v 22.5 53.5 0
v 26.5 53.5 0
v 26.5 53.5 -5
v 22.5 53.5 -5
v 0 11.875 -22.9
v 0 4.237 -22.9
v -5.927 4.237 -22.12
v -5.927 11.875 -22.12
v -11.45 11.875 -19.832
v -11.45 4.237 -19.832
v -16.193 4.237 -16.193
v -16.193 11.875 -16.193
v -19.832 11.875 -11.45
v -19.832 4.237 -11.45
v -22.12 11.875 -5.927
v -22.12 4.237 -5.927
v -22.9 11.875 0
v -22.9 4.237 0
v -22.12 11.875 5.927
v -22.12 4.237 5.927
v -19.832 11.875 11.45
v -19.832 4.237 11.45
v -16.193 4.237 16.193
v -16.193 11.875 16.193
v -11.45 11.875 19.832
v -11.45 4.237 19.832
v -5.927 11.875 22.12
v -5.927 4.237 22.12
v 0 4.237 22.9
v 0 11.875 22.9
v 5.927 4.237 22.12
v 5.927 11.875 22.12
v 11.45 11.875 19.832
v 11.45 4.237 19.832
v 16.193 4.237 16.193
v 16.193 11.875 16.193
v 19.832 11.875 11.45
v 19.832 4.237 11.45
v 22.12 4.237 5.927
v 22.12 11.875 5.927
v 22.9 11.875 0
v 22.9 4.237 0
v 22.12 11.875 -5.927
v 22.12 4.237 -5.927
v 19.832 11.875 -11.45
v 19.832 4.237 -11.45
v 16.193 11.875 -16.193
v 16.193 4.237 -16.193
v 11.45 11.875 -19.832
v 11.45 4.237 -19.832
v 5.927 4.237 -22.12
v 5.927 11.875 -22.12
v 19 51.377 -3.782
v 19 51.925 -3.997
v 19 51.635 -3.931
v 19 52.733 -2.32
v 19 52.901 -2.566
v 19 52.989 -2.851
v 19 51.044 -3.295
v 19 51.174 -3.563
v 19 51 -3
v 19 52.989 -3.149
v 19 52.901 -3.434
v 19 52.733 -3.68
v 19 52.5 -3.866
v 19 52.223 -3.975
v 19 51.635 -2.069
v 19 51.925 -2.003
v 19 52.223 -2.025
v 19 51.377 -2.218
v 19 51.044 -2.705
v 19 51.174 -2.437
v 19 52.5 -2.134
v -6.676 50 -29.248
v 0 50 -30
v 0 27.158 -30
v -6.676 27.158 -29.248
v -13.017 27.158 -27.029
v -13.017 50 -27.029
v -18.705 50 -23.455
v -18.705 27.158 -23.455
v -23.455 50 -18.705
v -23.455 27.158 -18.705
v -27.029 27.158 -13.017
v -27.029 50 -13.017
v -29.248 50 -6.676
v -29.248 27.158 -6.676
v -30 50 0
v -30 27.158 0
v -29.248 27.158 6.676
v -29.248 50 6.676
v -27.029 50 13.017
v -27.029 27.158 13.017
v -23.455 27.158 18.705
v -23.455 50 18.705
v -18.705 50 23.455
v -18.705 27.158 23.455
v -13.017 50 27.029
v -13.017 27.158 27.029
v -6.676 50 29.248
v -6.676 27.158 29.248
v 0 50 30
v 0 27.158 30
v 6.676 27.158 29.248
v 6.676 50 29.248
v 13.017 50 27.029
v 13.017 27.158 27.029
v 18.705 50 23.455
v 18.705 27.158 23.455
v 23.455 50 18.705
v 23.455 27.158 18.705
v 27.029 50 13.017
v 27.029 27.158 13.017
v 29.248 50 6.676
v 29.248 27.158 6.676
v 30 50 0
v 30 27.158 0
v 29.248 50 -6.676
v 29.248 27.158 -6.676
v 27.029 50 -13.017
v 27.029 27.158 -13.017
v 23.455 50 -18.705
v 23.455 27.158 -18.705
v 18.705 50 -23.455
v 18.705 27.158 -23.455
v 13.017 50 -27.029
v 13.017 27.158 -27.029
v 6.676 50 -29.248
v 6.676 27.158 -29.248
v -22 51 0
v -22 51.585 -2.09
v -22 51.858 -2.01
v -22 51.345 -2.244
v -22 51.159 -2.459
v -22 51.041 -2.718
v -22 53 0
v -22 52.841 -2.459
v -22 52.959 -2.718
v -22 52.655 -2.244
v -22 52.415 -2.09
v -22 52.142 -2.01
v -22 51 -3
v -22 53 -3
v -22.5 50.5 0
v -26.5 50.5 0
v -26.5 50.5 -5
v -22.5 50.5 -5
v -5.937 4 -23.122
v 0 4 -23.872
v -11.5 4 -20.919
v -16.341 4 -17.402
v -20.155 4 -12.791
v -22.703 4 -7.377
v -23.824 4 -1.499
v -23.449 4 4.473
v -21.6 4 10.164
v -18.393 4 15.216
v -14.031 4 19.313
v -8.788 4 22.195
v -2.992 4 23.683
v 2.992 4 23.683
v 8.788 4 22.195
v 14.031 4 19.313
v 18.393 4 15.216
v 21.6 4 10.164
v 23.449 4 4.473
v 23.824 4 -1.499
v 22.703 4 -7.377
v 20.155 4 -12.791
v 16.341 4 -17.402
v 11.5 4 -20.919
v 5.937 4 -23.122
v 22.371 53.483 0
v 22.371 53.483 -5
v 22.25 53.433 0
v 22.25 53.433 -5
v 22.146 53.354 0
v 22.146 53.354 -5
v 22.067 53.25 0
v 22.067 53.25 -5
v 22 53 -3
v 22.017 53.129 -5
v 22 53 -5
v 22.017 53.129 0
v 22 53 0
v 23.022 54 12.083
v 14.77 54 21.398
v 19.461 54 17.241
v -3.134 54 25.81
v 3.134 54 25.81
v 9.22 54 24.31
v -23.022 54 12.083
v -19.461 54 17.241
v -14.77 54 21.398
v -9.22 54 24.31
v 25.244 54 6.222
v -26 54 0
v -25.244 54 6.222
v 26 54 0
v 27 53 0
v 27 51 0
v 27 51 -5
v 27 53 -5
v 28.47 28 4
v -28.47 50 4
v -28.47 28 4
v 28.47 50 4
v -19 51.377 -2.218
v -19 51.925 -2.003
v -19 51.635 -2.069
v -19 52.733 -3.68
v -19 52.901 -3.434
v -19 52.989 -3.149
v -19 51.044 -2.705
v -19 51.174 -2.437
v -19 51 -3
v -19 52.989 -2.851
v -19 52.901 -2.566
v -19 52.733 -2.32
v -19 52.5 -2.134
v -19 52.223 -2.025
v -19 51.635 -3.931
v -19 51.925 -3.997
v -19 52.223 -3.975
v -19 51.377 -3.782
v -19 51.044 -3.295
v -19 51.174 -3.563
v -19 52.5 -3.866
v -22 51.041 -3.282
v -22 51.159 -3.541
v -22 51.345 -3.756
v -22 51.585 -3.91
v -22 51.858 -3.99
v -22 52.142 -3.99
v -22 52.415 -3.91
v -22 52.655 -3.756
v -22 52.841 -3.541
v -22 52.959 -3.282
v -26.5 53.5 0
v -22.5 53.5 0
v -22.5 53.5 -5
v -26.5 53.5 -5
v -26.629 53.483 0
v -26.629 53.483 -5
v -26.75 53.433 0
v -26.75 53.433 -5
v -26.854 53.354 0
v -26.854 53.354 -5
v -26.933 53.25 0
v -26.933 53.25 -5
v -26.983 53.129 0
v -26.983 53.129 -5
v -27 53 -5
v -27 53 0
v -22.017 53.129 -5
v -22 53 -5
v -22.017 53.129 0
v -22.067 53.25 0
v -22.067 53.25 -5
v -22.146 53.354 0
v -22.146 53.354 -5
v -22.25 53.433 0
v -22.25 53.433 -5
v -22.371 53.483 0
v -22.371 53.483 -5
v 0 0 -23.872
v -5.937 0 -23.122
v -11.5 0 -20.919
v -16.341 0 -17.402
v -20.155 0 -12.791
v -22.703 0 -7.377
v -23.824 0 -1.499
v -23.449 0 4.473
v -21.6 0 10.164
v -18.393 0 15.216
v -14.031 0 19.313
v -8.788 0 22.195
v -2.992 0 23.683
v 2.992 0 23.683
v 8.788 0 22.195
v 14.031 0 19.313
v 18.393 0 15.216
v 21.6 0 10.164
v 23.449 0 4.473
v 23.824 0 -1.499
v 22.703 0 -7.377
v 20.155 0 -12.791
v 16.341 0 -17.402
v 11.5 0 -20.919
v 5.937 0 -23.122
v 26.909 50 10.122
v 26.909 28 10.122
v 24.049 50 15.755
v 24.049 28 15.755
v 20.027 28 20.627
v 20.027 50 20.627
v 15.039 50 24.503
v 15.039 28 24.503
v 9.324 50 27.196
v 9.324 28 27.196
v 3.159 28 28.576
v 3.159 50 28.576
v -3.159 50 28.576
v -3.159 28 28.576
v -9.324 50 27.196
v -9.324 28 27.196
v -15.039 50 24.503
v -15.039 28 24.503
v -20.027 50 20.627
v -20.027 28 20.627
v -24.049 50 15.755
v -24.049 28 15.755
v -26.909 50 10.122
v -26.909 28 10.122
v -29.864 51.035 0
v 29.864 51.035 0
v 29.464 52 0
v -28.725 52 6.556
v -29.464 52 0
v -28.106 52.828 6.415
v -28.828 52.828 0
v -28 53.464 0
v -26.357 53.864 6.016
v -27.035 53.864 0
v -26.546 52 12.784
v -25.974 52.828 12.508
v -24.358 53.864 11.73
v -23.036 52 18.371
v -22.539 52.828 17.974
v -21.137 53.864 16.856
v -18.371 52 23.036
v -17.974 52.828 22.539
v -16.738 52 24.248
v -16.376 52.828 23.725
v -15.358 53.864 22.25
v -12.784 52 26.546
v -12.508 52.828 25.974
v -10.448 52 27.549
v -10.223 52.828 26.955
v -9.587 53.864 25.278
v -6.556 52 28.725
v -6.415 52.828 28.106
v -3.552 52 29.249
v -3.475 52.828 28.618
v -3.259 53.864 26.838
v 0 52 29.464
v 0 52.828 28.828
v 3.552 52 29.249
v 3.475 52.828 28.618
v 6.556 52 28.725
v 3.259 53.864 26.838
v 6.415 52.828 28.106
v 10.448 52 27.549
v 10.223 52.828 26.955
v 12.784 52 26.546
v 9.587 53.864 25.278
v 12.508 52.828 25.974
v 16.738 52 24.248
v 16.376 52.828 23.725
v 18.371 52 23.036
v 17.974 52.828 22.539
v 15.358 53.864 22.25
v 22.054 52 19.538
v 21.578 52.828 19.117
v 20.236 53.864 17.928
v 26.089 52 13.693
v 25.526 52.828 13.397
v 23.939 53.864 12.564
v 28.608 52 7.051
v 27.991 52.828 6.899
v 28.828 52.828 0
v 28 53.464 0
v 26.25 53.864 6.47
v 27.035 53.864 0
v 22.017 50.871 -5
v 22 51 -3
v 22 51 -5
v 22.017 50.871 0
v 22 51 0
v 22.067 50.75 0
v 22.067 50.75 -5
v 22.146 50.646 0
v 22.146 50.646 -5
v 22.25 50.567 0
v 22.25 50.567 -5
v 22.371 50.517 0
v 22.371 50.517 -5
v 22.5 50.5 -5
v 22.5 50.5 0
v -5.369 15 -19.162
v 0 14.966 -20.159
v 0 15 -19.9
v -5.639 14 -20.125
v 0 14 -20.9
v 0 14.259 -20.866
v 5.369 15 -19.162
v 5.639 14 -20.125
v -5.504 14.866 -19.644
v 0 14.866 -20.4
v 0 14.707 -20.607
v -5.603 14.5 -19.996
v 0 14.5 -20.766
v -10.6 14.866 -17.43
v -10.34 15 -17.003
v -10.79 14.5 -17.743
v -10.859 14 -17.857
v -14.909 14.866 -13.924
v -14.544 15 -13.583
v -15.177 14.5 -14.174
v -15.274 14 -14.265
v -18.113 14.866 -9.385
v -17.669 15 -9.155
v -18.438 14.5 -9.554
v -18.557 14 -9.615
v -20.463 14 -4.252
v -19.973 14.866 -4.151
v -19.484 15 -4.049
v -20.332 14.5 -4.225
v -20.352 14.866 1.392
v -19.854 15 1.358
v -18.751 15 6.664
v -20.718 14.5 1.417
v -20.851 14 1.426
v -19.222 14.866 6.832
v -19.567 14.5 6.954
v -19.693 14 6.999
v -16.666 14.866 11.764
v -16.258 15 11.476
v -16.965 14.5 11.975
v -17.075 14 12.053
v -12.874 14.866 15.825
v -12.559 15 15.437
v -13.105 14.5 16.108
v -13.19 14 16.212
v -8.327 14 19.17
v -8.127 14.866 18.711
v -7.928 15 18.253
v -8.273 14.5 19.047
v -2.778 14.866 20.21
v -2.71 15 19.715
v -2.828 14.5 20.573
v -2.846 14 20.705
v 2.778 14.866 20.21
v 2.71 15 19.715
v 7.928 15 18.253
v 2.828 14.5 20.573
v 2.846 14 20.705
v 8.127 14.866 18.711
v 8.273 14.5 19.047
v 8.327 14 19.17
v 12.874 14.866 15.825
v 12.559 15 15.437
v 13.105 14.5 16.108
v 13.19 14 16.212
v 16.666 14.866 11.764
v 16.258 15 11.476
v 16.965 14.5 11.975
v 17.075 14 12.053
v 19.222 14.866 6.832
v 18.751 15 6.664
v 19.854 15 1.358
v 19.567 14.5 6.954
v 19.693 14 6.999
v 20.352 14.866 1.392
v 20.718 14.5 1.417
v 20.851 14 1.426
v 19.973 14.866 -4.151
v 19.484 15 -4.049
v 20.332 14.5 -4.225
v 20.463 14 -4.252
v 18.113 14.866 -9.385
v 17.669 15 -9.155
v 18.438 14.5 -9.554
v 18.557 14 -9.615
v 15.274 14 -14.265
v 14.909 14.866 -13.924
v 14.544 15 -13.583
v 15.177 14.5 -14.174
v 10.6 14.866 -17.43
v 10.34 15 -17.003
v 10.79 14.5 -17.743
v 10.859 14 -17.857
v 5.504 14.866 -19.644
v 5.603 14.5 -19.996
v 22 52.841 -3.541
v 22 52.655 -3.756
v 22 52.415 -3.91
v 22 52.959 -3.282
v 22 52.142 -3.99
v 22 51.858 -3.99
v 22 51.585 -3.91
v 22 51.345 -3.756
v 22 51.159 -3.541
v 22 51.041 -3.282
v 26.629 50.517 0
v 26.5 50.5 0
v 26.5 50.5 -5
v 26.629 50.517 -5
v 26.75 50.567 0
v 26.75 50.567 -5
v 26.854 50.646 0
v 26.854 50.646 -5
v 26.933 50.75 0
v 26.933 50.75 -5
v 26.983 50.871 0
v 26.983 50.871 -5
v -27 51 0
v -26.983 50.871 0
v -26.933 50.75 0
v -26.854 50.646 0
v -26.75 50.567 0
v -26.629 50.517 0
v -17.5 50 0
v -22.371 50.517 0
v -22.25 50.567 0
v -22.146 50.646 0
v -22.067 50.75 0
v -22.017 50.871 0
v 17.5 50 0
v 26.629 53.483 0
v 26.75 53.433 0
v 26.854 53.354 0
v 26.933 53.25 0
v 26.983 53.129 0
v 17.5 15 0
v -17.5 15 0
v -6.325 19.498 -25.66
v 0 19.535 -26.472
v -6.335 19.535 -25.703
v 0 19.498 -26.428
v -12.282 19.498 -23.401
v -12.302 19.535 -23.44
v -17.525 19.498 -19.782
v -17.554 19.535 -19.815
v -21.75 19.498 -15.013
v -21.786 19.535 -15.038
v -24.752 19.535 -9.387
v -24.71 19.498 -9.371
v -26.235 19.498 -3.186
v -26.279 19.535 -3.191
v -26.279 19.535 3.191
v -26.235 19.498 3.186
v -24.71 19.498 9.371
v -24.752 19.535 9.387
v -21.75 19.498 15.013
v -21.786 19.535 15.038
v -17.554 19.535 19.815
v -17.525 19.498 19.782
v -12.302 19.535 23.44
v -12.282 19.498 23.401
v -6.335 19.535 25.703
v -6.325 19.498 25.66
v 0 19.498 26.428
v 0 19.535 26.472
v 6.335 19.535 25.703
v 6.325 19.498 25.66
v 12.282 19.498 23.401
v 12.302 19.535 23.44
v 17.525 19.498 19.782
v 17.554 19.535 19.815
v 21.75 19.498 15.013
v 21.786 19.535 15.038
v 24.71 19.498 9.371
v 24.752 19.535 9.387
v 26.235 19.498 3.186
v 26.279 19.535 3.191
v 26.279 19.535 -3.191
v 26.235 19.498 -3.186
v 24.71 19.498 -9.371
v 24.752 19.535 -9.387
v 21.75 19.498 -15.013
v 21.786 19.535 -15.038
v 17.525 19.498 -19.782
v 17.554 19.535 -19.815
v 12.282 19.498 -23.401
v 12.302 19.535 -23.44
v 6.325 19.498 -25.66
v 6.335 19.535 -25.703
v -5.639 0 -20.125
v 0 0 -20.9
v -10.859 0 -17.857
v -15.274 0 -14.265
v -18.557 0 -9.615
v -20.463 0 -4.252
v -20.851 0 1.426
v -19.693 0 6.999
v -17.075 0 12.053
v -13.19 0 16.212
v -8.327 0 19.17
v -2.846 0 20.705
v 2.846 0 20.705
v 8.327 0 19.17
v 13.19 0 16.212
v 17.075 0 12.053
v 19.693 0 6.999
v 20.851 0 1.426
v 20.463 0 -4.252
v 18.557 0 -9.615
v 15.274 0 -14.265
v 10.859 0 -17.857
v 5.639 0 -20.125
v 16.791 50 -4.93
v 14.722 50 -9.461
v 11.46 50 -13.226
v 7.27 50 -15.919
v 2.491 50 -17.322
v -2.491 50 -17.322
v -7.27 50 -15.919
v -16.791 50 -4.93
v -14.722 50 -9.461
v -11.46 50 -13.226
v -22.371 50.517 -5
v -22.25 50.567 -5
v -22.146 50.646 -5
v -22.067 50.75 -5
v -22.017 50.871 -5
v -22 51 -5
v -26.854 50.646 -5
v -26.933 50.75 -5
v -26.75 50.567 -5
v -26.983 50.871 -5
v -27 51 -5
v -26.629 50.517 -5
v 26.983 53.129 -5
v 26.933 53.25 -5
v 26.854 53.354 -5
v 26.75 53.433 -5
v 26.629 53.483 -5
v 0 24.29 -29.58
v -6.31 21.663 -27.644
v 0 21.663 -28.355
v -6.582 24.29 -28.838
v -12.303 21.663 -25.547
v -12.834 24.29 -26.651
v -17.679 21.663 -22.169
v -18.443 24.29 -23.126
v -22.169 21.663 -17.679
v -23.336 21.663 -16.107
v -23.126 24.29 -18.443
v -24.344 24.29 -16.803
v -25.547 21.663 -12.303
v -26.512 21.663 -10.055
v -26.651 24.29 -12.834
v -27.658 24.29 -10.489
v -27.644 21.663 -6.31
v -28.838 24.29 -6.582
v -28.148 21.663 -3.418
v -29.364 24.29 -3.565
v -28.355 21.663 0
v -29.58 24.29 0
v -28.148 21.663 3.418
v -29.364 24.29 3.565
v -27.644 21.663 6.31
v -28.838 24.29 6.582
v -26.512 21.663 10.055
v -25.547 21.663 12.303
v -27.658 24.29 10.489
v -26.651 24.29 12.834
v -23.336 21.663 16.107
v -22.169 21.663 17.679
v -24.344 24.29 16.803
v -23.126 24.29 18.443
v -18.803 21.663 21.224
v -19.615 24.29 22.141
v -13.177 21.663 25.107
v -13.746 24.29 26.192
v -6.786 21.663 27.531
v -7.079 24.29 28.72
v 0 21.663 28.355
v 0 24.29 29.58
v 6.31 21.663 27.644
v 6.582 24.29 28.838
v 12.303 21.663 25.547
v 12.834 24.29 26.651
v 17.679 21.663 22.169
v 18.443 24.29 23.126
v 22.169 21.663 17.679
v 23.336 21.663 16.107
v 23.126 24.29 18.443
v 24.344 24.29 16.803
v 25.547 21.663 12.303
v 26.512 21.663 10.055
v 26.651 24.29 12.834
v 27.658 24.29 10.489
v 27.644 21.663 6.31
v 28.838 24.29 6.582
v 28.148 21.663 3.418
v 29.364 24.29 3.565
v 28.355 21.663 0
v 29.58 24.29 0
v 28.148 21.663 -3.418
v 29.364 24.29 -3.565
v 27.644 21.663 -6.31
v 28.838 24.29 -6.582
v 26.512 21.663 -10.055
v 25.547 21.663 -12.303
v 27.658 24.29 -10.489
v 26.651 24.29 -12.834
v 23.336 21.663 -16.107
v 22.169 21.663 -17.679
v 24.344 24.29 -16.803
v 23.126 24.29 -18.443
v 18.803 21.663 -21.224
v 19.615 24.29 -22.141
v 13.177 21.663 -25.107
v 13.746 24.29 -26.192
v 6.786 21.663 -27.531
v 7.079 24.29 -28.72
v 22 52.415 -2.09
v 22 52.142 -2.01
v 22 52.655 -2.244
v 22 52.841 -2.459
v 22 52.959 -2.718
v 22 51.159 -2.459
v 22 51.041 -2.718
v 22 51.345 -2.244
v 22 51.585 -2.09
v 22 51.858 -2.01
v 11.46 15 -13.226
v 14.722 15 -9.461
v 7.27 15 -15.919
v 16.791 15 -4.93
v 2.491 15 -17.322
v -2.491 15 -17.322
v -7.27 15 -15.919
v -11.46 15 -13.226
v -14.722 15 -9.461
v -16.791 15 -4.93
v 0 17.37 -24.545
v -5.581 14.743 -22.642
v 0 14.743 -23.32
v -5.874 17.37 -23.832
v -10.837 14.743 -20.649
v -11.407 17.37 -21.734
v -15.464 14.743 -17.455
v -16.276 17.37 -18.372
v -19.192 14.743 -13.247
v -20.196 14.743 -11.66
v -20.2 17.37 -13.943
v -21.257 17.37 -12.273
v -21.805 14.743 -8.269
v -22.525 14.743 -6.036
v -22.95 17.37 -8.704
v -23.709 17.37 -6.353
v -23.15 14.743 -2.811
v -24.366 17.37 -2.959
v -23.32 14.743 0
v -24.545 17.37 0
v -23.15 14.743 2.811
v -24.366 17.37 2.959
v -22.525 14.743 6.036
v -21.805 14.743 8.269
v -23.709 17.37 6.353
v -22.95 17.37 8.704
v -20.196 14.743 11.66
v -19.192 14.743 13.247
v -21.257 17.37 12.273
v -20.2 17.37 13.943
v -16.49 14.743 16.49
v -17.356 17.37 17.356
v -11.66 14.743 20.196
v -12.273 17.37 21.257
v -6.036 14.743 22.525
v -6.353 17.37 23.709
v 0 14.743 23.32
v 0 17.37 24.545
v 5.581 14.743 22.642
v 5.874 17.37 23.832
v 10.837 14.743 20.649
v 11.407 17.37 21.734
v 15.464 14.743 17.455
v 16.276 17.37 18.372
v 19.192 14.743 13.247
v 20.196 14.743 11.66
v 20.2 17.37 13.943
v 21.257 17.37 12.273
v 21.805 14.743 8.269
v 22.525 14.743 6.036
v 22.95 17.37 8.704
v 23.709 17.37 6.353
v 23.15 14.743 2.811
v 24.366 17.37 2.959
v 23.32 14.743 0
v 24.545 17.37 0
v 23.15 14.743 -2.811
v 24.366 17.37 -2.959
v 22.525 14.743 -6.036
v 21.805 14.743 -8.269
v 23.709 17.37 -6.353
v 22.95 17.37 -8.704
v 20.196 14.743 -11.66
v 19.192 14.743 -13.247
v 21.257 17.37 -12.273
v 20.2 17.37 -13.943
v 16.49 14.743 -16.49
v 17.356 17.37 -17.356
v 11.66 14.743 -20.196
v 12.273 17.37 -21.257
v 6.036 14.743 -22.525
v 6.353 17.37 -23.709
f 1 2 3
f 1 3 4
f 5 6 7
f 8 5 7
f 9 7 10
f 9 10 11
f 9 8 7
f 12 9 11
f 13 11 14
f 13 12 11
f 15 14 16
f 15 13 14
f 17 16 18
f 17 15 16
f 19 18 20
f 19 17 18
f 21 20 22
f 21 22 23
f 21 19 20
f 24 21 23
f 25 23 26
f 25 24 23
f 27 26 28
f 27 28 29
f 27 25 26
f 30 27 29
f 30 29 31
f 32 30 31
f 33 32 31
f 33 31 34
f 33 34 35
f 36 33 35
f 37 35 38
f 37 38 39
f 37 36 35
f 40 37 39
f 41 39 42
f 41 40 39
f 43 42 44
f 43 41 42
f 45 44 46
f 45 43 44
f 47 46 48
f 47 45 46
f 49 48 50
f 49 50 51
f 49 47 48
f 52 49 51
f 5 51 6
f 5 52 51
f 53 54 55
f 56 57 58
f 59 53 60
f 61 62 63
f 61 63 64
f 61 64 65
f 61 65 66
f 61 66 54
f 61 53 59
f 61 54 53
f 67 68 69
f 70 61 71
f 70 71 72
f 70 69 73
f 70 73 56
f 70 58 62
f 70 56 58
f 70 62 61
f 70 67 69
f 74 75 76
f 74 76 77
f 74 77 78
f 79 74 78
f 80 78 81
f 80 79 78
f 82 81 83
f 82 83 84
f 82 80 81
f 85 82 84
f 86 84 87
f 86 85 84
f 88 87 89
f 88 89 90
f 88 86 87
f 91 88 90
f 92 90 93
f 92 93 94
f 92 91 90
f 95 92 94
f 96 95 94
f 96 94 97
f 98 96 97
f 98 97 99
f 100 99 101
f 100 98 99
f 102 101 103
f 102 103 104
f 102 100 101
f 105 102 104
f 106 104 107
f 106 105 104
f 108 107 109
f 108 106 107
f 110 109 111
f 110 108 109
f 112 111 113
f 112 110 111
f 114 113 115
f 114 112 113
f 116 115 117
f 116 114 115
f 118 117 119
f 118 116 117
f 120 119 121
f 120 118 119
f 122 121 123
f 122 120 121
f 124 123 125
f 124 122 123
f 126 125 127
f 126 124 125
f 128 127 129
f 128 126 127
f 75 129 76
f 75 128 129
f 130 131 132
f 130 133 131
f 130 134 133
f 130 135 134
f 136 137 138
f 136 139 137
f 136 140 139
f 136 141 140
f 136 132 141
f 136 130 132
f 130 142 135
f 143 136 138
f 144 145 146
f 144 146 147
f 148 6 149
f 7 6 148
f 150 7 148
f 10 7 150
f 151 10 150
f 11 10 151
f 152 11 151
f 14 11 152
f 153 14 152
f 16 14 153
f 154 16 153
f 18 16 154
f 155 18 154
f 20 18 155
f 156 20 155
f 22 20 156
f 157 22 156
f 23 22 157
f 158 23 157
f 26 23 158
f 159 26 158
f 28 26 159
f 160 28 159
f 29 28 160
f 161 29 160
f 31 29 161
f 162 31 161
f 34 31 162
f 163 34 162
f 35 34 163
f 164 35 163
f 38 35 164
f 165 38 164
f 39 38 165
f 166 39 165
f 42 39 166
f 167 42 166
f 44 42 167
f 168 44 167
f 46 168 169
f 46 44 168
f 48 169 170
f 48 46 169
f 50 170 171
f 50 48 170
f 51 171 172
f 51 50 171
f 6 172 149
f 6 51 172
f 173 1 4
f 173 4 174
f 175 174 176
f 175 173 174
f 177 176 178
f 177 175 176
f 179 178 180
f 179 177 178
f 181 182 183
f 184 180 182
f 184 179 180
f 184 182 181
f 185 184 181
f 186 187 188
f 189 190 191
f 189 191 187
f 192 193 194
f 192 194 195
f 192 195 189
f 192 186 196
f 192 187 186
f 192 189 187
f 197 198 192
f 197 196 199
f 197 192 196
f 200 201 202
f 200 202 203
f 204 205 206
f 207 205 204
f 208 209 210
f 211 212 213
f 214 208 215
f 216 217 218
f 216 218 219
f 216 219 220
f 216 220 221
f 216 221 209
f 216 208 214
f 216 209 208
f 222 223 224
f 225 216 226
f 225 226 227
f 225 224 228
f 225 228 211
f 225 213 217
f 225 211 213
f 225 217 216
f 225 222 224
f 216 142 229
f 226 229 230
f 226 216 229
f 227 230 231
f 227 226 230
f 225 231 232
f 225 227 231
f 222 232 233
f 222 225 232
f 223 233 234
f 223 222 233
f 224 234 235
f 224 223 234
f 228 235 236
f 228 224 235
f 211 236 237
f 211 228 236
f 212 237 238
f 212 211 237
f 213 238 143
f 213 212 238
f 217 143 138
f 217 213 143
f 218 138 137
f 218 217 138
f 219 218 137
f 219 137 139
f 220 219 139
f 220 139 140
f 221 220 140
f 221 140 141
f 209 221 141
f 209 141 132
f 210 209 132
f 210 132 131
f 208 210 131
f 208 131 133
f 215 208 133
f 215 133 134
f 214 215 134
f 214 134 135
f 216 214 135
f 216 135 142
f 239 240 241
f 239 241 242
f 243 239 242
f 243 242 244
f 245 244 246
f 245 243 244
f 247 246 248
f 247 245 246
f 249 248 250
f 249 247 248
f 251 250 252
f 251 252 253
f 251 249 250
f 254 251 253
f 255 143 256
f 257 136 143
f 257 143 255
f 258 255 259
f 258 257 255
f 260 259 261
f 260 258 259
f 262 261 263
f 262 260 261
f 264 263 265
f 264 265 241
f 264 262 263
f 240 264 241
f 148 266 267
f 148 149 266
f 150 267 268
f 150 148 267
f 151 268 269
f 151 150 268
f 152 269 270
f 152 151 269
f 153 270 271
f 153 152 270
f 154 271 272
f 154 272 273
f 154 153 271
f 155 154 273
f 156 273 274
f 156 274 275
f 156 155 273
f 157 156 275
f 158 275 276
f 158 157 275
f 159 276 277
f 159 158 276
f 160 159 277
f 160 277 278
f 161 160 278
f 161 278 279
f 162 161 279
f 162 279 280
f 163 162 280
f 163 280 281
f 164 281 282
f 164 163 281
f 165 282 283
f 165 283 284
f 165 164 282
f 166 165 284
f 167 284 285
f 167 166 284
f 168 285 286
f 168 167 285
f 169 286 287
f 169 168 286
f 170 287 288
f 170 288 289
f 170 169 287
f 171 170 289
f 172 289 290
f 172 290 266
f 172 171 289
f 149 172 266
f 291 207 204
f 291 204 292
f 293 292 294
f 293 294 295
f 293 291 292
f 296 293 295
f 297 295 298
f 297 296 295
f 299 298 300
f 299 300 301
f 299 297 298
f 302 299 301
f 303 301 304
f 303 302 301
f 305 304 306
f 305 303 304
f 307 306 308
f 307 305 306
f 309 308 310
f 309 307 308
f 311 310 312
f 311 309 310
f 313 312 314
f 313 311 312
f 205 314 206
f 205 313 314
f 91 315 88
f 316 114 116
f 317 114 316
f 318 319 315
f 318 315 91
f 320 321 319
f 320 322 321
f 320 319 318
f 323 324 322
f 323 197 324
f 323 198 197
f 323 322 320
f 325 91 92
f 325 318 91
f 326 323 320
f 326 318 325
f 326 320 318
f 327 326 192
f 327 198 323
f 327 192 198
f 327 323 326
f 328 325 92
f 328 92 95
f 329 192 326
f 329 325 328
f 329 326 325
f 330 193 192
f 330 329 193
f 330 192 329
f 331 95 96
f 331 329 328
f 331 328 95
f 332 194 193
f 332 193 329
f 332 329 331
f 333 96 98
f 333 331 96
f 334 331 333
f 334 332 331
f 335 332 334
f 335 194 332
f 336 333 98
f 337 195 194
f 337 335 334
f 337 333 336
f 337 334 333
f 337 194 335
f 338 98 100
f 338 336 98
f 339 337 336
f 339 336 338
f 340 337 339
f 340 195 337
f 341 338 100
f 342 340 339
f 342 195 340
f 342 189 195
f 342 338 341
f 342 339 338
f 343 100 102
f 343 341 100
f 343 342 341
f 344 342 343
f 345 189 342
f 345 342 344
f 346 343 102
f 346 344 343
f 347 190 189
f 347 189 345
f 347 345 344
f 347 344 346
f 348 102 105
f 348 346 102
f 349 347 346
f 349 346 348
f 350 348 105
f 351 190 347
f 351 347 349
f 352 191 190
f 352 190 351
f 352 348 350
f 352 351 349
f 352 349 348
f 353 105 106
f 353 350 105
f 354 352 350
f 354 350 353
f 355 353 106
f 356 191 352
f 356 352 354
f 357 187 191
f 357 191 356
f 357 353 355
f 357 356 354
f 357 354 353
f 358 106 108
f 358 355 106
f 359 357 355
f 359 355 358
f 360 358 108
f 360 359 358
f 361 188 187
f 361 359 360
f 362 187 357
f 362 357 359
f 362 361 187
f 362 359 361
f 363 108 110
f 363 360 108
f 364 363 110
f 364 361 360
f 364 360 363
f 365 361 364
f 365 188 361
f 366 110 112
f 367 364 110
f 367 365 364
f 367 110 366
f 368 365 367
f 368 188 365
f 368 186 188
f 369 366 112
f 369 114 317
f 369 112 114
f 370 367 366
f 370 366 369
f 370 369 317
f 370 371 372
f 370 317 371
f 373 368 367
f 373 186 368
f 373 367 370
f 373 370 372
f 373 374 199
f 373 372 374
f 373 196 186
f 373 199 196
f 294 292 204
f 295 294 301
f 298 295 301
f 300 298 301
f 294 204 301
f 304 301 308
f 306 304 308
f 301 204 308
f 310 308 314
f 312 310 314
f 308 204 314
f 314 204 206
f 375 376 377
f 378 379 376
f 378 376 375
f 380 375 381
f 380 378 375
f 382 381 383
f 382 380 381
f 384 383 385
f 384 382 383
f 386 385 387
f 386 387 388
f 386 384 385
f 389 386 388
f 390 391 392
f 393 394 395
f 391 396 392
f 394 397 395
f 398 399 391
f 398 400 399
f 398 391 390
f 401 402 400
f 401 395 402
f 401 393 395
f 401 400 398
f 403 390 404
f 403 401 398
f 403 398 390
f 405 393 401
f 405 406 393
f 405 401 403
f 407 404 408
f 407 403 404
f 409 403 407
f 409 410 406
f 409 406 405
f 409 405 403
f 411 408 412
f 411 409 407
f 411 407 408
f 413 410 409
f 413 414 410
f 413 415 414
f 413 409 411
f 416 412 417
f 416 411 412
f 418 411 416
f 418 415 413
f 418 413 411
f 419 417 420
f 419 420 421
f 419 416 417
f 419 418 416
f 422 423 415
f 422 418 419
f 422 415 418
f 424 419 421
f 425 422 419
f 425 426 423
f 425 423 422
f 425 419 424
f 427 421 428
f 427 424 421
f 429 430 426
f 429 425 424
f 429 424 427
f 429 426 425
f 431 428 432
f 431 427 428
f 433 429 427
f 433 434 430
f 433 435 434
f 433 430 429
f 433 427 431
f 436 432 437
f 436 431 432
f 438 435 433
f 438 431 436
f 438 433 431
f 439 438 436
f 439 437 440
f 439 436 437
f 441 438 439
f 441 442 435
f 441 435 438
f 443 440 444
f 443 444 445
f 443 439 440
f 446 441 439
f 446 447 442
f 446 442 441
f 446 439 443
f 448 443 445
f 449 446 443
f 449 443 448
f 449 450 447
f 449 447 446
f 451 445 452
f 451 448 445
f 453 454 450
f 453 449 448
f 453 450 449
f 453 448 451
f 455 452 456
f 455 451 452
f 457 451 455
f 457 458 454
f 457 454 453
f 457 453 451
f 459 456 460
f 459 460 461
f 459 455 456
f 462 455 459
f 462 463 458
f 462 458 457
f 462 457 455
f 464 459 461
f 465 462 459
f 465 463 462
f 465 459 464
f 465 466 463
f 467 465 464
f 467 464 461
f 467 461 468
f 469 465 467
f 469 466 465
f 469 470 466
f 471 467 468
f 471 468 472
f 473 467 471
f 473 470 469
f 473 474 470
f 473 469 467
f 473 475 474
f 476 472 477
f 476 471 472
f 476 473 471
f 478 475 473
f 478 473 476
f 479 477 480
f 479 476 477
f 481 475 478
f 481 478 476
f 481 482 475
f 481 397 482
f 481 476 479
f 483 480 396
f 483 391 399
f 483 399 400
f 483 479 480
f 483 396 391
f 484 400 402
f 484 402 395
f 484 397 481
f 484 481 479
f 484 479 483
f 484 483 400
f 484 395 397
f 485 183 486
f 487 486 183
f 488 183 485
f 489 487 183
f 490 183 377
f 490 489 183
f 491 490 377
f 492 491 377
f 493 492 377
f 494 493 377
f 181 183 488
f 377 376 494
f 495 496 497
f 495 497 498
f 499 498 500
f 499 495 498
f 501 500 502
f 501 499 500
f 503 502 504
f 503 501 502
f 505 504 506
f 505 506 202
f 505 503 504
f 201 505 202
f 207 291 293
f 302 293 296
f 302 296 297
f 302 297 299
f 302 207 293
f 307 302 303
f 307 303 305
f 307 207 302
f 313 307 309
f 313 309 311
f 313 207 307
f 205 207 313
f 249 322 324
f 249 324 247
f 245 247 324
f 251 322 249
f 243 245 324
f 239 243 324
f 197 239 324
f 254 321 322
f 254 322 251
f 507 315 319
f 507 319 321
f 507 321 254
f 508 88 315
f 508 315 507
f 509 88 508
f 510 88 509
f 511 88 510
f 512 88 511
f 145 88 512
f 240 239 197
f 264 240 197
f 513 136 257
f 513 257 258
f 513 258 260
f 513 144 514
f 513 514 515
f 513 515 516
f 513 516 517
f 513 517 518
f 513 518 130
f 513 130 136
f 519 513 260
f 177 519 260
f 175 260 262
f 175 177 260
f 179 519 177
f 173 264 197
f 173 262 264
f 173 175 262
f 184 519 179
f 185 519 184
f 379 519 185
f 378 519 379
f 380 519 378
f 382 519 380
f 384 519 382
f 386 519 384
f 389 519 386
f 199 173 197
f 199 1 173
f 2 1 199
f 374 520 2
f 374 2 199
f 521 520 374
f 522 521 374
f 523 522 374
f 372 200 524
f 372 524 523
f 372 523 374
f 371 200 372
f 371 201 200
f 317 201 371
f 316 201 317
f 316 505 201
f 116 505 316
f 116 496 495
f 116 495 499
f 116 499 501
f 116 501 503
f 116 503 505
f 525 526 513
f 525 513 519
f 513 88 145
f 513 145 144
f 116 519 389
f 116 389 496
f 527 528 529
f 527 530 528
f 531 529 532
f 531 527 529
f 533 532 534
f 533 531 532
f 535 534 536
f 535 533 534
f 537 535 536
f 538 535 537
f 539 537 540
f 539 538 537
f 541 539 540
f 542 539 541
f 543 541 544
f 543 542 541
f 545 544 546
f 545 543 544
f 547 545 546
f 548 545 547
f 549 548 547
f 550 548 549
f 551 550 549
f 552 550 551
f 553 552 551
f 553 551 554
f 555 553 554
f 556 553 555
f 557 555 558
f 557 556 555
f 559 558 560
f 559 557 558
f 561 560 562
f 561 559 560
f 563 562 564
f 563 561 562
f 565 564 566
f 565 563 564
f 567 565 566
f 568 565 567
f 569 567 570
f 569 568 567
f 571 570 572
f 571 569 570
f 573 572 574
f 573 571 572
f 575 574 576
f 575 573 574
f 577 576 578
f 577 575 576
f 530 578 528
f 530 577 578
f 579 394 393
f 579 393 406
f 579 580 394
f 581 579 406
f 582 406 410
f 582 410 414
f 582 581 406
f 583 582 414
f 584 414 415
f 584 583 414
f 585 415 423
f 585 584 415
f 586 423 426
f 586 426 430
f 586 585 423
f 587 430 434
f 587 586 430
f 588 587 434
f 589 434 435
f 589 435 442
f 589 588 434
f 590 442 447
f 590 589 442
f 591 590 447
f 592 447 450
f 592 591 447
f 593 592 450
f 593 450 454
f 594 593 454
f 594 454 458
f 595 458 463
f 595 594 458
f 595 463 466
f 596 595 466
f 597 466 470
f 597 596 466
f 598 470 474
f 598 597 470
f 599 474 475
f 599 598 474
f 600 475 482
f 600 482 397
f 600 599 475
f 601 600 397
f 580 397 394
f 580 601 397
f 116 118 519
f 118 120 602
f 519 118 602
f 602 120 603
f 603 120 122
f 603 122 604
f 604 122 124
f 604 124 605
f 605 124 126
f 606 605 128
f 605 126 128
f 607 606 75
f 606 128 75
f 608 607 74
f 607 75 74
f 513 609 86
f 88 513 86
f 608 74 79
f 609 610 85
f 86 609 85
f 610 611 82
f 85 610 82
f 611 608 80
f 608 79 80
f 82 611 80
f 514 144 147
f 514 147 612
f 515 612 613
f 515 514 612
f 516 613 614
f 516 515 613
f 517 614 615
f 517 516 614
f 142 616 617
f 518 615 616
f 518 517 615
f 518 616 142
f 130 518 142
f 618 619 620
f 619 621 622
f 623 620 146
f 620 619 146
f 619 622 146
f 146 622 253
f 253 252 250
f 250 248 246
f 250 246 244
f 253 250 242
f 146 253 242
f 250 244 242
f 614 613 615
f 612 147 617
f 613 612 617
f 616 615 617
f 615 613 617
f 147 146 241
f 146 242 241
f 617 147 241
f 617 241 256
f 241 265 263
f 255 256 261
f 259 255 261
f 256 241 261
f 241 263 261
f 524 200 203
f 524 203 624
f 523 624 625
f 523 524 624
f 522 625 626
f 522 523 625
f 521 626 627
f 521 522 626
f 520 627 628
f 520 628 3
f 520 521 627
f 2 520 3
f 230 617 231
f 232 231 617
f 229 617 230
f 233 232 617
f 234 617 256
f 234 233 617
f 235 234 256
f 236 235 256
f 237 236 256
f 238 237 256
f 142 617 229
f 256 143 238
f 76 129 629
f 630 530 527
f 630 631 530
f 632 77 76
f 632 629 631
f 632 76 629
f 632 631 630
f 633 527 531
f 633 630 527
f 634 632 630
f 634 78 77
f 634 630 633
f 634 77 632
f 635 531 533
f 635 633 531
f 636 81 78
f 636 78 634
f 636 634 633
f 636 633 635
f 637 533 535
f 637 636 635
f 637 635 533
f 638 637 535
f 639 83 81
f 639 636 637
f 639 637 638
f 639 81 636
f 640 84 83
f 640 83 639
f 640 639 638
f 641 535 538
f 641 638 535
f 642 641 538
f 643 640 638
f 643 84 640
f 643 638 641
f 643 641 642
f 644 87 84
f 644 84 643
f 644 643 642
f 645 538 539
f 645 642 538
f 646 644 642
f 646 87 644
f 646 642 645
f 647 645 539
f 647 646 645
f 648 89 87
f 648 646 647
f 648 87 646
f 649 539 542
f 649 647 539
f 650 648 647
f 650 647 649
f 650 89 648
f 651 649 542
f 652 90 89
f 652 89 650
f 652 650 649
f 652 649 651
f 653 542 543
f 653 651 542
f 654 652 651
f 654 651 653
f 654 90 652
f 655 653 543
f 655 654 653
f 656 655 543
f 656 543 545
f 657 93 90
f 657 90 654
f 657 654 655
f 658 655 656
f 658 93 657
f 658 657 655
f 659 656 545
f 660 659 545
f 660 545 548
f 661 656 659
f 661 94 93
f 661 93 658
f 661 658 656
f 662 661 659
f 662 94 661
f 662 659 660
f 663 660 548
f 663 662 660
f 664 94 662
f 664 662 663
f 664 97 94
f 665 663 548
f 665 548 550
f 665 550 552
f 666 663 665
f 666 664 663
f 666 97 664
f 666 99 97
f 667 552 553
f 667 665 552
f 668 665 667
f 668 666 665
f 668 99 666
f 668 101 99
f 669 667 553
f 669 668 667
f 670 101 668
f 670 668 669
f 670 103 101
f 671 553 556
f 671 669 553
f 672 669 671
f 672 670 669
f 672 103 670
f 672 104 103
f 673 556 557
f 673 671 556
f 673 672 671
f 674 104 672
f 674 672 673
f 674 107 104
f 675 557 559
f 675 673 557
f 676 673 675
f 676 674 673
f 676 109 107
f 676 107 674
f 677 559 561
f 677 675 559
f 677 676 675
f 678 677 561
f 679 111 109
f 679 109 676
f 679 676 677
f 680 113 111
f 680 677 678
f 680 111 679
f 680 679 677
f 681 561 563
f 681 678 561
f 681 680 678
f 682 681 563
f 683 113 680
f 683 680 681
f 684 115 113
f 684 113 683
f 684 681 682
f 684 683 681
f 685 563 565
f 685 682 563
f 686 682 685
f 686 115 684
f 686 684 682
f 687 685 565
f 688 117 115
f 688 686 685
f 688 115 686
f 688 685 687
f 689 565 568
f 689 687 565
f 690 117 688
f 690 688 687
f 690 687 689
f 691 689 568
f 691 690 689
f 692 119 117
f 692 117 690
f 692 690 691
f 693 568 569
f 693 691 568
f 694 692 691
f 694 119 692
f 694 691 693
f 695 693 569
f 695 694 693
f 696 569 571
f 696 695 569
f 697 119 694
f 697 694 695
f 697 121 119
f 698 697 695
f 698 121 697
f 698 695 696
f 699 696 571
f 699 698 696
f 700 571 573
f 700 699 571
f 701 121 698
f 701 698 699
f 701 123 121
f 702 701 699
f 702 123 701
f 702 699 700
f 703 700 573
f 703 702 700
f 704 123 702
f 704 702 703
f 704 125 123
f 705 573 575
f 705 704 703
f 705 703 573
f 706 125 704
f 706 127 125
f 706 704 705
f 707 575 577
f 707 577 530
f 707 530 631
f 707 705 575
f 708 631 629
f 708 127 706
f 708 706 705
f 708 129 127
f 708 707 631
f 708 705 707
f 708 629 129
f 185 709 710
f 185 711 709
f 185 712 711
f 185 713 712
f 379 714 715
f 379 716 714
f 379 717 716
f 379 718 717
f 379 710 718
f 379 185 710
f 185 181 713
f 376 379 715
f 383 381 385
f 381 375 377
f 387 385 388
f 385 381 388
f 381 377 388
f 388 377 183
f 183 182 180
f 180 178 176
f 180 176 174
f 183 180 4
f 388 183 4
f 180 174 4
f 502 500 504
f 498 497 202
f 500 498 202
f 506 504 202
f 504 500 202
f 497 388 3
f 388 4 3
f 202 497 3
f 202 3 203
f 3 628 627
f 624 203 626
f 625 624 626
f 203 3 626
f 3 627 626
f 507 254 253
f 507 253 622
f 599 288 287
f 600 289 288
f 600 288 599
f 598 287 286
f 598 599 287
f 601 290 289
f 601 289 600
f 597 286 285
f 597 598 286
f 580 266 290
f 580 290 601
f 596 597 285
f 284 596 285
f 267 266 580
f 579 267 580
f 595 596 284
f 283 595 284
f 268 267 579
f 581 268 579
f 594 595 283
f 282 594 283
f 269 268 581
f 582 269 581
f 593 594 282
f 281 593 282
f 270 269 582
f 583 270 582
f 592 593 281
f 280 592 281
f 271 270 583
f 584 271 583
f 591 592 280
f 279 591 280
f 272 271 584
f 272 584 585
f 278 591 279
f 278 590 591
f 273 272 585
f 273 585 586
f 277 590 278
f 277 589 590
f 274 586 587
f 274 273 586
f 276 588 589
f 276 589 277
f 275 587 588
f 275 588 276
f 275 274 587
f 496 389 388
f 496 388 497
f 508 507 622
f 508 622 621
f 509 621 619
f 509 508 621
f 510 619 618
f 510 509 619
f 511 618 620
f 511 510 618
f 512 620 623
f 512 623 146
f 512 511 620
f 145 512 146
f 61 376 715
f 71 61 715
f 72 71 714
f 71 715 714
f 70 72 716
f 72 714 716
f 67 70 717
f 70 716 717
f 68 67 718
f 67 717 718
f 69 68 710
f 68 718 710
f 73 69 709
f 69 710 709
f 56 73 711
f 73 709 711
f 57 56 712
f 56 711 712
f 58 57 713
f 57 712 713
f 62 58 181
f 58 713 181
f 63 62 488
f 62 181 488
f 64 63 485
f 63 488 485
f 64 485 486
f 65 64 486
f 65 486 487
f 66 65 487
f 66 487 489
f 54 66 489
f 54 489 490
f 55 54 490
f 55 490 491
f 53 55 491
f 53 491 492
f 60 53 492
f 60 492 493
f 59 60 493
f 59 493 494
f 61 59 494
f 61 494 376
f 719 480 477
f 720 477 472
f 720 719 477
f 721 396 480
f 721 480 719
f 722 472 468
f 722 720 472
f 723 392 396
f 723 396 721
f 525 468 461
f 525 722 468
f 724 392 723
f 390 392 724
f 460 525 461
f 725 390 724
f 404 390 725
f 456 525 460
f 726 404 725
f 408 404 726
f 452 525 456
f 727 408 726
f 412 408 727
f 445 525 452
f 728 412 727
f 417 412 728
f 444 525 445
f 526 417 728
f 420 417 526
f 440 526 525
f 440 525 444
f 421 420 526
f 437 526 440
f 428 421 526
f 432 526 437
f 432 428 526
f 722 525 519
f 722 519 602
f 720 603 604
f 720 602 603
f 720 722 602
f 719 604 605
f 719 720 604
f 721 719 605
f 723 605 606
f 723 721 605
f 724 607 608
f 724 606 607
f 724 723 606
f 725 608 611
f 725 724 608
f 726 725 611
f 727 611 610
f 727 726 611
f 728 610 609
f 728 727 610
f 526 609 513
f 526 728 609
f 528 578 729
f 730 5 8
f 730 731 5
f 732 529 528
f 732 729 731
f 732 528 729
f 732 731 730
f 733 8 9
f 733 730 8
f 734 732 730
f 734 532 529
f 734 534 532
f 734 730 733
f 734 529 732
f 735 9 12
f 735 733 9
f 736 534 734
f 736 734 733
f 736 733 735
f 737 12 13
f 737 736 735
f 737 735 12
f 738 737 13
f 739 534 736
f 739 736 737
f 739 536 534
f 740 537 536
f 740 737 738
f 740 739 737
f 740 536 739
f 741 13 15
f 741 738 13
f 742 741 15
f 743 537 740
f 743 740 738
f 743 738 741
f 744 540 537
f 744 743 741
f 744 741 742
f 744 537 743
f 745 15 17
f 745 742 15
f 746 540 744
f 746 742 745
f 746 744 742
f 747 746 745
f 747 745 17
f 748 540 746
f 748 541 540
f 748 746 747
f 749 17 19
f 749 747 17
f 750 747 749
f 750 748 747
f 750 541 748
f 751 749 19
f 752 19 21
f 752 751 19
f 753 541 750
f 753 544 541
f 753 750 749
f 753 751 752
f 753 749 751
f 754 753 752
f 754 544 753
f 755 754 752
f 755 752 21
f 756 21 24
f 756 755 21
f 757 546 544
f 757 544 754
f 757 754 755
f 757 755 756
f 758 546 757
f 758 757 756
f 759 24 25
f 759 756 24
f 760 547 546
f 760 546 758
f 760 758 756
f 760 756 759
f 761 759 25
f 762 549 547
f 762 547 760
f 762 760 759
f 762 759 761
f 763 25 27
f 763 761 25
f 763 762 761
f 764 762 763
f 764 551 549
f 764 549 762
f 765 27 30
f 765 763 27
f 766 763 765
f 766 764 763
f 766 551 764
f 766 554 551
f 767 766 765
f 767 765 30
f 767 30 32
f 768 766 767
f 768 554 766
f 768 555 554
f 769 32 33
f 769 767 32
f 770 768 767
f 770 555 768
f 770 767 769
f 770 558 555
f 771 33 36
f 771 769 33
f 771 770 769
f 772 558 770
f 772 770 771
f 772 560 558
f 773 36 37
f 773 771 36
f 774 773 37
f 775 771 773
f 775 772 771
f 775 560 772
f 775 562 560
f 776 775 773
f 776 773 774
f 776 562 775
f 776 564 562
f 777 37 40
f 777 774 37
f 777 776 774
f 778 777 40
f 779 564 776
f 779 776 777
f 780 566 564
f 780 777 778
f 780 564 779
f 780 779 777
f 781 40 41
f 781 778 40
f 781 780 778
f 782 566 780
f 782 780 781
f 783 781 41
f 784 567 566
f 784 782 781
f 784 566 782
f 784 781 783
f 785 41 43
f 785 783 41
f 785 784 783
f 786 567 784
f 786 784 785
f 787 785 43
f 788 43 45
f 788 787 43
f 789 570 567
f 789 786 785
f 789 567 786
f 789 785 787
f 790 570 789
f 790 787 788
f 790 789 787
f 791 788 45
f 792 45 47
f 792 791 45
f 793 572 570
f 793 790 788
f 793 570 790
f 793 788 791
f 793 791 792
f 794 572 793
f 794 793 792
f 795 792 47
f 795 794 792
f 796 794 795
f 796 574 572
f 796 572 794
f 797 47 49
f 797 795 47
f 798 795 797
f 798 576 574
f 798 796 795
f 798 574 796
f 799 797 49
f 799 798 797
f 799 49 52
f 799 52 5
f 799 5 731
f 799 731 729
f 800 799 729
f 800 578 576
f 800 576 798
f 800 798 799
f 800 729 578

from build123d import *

# Parameters (mm, degrees)
CUT_EXTRUDE3_DEPTH      = 45
CUT_EXTRUDE3_DEPTH_BACK = 20
CUT_EXTRUDE5_START      = -5
CUT_EXTRUDE5_DEPTH      = 5
BOSS_EXTRUDE2_DEPTH     = 5
SKETCH14_R              = 1
BOSS_EXTRUDE3_DEPTH     = 3
BOSS_EXTRUDE4_START     = 3
SKETCH15_R              = 1
BOSS_EXTRUDE4_DEPTH     = 3
CUT_EXTRUDE6_DEPTH      = 22


with BuildPart() as part:
    # Sketch1 → Revolve1 (revolve)
    with BuildSketch(Plane.XY, mode=Mode.PRIVATE) as revolve1_sk:
        with BuildLine():
            Line((20.9, 0), (23.871591838, 0))
            Line((23.871591838, 0), (23.871591838, 4))
            Line((23.871591838, 4), (22.9, 4.236662843))
            Line((22.9, 4.236662843), (22.9, 11.874576818))
            ThreePointArc((22.9, 11.874576818), (23.83692213, 16.100759435), (26.472123903, 19.535021249))
            Line((26.472123903, 19.535021249), (26.427876097, 19.497892931))
            ThreePointArc((26.427876097, 19.497892931), (29.06307787, 22.932154745), (30, 27.158337362))
            Line((30, 27.158337362), (30, 50))
            ThreePointArc((30, 50), (28.828427125, 52.828427125), (26, 54))
            Line((26, 54), (0, 54))
            Line((0, 54), (0, 15))
            Line((0, 15), (19.9, 15))
            ThreePointArc((19.9, 15), (20.607106781, 14.707106781), (20.9, 14))
            Line((20.9, 14), (20.9, 0))
        make_face()
    revolve(revolve1_sk.sketch.rotate(Axis((0, 0, 0), (0, 1, 0)), 90), axis=Axis((0, 0, 0), (0, 1, 0)))

    # Sketch11 → Cut-Extrude3 (cut, two sides: drawn at the far end of the back side and taken through both)
    with BuildSketch(Plane(origin=(0, 17, 0), x_dir=(1, 0, 0), z_dir=(0, 1, 0)).offset(-CUT_EXTRUDE3_DEPTH_BACK)):
        with BuildLine():
            Line((-17.5, 0), (17.5, 0))
            ThreePointArc((17.5, 0), (0, 17.5), (-17.5, 0))
        make_face()
    extrude(amount=CUT_EXTRUDE3_DEPTH + CUT_EXTRUDE3_DEPTH_BACK, mode=Mode.SUBTRACT)

    # Sketch9 → Cut-Extrude5 (cut)
    with BuildSketch(Plane(origin=(0, 50, 0), x_dir=(-1, 0, 0), z_dir=(0, -1, 0)).offset(CUT_EXTRUDE5_START)):
        with BuildLine():
            Line((-30, 0), (30, 0))
            ThreePointArc((30, 0), (0, 30), (-30, 0))
        make_face()
    extrude(amount=CUT_EXTRUDE5_DEPTH, mode=Mode.SUBTRACT)

    # Sketch13 → Boss-Extrude2 (add)
    with BuildSketch(Plane(origin=(0, 0, 0), x_dir=(-1, 0, 0), z_dir=(0, 0, -1))):
        with BuildLine():
            Line((22.5, 53.5), (26.5, 53.5))
            ThreePointArc((26.5, 53.5), (26.853553391, 53.353553391), (27, 53))
            Line((27, 53), (27, 51))
            ThreePointArc((27, 51), (26.853553391, 50.646446609), (26.5, 50.5))
            Line((26.5, 50.5), (22.5, 50.5))
            ThreePointArc((22.5, 50.5), (22.146446609, 50.646446609), (22, 51))
            Line((22, 51), (22, 53))
            ThreePointArc((22, 53), (22.146446609, 53.353553391), (22.5, 53.5))
        make_face()
        with BuildLine():
            Line((-26.5, 53.5), (-22.5, 53.5))
            ThreePointArc((-22.5, 53.5), (-22.146446609, 53.353553391), (-22, 53))
            Line((-22, 53), (-22, 51))
            ThreePointArc((-22, 51), (-22.146446609, 50.646446609), (-22.5, 50.5))
            Line((-22.5, 50.5), (-26.5, 50.5))
            ThreePointArc((-26.5, 50.5), (-26.853553391, 50.646446609), (-27, 51))
            Line((-27, 51), (-27, 53))
            ThreePointArc((-27, 53), (-26.853553391, 53.353553391), (-26.5, 53.5))
        make_face()
    extrude(amount=BOSS_EXTRUDE2_DEPTH)

    # Sketch14 → Boss-Extrude3 (add)
    with BuildSketch(Plane.ZY.offset(-22)):
        with Locations(Location((-3, 52, 0), (0, 0, 270))):
            Circle(SKETCH14_R)
    extrude(amount=BOSS_EXTRUDE3_DEPTH)

    # Sketch15 → Boss-Extrude4 (add)
    with BuildSketch(Plane(origin=(-22, 0, 0), x_dir=(0, 0, -1), z_dir=(1, 0, 0)).offset(BOSS_EXTRUDE4_START)):
        with Locations(Location((3, 52, 0), (0, 0, 270))):
            Circle(SKETCH15_R)
    extrude(amount=-BOSS_EXTRUDE4_DEPTH)

    # Sketch16 → Cut-Extrude6 (cut)
    with BuildSketch(Plane(origin=(0, 50, 0), x_dir=(-1, 0, 0), z_dir=(0, -1, 0))):
        with BuildLine():
            Line((28.470379344, -4), (-28.470379344, -4))
            ThreePointArc((-28.470379344, -4), (0, -28.75), (28.470379344, -4))
        make_face()
    extrude(amount=CUT_EXTRUDE6_DEPTH, mode=Mode.SUBTRACT)


solid = part.part
